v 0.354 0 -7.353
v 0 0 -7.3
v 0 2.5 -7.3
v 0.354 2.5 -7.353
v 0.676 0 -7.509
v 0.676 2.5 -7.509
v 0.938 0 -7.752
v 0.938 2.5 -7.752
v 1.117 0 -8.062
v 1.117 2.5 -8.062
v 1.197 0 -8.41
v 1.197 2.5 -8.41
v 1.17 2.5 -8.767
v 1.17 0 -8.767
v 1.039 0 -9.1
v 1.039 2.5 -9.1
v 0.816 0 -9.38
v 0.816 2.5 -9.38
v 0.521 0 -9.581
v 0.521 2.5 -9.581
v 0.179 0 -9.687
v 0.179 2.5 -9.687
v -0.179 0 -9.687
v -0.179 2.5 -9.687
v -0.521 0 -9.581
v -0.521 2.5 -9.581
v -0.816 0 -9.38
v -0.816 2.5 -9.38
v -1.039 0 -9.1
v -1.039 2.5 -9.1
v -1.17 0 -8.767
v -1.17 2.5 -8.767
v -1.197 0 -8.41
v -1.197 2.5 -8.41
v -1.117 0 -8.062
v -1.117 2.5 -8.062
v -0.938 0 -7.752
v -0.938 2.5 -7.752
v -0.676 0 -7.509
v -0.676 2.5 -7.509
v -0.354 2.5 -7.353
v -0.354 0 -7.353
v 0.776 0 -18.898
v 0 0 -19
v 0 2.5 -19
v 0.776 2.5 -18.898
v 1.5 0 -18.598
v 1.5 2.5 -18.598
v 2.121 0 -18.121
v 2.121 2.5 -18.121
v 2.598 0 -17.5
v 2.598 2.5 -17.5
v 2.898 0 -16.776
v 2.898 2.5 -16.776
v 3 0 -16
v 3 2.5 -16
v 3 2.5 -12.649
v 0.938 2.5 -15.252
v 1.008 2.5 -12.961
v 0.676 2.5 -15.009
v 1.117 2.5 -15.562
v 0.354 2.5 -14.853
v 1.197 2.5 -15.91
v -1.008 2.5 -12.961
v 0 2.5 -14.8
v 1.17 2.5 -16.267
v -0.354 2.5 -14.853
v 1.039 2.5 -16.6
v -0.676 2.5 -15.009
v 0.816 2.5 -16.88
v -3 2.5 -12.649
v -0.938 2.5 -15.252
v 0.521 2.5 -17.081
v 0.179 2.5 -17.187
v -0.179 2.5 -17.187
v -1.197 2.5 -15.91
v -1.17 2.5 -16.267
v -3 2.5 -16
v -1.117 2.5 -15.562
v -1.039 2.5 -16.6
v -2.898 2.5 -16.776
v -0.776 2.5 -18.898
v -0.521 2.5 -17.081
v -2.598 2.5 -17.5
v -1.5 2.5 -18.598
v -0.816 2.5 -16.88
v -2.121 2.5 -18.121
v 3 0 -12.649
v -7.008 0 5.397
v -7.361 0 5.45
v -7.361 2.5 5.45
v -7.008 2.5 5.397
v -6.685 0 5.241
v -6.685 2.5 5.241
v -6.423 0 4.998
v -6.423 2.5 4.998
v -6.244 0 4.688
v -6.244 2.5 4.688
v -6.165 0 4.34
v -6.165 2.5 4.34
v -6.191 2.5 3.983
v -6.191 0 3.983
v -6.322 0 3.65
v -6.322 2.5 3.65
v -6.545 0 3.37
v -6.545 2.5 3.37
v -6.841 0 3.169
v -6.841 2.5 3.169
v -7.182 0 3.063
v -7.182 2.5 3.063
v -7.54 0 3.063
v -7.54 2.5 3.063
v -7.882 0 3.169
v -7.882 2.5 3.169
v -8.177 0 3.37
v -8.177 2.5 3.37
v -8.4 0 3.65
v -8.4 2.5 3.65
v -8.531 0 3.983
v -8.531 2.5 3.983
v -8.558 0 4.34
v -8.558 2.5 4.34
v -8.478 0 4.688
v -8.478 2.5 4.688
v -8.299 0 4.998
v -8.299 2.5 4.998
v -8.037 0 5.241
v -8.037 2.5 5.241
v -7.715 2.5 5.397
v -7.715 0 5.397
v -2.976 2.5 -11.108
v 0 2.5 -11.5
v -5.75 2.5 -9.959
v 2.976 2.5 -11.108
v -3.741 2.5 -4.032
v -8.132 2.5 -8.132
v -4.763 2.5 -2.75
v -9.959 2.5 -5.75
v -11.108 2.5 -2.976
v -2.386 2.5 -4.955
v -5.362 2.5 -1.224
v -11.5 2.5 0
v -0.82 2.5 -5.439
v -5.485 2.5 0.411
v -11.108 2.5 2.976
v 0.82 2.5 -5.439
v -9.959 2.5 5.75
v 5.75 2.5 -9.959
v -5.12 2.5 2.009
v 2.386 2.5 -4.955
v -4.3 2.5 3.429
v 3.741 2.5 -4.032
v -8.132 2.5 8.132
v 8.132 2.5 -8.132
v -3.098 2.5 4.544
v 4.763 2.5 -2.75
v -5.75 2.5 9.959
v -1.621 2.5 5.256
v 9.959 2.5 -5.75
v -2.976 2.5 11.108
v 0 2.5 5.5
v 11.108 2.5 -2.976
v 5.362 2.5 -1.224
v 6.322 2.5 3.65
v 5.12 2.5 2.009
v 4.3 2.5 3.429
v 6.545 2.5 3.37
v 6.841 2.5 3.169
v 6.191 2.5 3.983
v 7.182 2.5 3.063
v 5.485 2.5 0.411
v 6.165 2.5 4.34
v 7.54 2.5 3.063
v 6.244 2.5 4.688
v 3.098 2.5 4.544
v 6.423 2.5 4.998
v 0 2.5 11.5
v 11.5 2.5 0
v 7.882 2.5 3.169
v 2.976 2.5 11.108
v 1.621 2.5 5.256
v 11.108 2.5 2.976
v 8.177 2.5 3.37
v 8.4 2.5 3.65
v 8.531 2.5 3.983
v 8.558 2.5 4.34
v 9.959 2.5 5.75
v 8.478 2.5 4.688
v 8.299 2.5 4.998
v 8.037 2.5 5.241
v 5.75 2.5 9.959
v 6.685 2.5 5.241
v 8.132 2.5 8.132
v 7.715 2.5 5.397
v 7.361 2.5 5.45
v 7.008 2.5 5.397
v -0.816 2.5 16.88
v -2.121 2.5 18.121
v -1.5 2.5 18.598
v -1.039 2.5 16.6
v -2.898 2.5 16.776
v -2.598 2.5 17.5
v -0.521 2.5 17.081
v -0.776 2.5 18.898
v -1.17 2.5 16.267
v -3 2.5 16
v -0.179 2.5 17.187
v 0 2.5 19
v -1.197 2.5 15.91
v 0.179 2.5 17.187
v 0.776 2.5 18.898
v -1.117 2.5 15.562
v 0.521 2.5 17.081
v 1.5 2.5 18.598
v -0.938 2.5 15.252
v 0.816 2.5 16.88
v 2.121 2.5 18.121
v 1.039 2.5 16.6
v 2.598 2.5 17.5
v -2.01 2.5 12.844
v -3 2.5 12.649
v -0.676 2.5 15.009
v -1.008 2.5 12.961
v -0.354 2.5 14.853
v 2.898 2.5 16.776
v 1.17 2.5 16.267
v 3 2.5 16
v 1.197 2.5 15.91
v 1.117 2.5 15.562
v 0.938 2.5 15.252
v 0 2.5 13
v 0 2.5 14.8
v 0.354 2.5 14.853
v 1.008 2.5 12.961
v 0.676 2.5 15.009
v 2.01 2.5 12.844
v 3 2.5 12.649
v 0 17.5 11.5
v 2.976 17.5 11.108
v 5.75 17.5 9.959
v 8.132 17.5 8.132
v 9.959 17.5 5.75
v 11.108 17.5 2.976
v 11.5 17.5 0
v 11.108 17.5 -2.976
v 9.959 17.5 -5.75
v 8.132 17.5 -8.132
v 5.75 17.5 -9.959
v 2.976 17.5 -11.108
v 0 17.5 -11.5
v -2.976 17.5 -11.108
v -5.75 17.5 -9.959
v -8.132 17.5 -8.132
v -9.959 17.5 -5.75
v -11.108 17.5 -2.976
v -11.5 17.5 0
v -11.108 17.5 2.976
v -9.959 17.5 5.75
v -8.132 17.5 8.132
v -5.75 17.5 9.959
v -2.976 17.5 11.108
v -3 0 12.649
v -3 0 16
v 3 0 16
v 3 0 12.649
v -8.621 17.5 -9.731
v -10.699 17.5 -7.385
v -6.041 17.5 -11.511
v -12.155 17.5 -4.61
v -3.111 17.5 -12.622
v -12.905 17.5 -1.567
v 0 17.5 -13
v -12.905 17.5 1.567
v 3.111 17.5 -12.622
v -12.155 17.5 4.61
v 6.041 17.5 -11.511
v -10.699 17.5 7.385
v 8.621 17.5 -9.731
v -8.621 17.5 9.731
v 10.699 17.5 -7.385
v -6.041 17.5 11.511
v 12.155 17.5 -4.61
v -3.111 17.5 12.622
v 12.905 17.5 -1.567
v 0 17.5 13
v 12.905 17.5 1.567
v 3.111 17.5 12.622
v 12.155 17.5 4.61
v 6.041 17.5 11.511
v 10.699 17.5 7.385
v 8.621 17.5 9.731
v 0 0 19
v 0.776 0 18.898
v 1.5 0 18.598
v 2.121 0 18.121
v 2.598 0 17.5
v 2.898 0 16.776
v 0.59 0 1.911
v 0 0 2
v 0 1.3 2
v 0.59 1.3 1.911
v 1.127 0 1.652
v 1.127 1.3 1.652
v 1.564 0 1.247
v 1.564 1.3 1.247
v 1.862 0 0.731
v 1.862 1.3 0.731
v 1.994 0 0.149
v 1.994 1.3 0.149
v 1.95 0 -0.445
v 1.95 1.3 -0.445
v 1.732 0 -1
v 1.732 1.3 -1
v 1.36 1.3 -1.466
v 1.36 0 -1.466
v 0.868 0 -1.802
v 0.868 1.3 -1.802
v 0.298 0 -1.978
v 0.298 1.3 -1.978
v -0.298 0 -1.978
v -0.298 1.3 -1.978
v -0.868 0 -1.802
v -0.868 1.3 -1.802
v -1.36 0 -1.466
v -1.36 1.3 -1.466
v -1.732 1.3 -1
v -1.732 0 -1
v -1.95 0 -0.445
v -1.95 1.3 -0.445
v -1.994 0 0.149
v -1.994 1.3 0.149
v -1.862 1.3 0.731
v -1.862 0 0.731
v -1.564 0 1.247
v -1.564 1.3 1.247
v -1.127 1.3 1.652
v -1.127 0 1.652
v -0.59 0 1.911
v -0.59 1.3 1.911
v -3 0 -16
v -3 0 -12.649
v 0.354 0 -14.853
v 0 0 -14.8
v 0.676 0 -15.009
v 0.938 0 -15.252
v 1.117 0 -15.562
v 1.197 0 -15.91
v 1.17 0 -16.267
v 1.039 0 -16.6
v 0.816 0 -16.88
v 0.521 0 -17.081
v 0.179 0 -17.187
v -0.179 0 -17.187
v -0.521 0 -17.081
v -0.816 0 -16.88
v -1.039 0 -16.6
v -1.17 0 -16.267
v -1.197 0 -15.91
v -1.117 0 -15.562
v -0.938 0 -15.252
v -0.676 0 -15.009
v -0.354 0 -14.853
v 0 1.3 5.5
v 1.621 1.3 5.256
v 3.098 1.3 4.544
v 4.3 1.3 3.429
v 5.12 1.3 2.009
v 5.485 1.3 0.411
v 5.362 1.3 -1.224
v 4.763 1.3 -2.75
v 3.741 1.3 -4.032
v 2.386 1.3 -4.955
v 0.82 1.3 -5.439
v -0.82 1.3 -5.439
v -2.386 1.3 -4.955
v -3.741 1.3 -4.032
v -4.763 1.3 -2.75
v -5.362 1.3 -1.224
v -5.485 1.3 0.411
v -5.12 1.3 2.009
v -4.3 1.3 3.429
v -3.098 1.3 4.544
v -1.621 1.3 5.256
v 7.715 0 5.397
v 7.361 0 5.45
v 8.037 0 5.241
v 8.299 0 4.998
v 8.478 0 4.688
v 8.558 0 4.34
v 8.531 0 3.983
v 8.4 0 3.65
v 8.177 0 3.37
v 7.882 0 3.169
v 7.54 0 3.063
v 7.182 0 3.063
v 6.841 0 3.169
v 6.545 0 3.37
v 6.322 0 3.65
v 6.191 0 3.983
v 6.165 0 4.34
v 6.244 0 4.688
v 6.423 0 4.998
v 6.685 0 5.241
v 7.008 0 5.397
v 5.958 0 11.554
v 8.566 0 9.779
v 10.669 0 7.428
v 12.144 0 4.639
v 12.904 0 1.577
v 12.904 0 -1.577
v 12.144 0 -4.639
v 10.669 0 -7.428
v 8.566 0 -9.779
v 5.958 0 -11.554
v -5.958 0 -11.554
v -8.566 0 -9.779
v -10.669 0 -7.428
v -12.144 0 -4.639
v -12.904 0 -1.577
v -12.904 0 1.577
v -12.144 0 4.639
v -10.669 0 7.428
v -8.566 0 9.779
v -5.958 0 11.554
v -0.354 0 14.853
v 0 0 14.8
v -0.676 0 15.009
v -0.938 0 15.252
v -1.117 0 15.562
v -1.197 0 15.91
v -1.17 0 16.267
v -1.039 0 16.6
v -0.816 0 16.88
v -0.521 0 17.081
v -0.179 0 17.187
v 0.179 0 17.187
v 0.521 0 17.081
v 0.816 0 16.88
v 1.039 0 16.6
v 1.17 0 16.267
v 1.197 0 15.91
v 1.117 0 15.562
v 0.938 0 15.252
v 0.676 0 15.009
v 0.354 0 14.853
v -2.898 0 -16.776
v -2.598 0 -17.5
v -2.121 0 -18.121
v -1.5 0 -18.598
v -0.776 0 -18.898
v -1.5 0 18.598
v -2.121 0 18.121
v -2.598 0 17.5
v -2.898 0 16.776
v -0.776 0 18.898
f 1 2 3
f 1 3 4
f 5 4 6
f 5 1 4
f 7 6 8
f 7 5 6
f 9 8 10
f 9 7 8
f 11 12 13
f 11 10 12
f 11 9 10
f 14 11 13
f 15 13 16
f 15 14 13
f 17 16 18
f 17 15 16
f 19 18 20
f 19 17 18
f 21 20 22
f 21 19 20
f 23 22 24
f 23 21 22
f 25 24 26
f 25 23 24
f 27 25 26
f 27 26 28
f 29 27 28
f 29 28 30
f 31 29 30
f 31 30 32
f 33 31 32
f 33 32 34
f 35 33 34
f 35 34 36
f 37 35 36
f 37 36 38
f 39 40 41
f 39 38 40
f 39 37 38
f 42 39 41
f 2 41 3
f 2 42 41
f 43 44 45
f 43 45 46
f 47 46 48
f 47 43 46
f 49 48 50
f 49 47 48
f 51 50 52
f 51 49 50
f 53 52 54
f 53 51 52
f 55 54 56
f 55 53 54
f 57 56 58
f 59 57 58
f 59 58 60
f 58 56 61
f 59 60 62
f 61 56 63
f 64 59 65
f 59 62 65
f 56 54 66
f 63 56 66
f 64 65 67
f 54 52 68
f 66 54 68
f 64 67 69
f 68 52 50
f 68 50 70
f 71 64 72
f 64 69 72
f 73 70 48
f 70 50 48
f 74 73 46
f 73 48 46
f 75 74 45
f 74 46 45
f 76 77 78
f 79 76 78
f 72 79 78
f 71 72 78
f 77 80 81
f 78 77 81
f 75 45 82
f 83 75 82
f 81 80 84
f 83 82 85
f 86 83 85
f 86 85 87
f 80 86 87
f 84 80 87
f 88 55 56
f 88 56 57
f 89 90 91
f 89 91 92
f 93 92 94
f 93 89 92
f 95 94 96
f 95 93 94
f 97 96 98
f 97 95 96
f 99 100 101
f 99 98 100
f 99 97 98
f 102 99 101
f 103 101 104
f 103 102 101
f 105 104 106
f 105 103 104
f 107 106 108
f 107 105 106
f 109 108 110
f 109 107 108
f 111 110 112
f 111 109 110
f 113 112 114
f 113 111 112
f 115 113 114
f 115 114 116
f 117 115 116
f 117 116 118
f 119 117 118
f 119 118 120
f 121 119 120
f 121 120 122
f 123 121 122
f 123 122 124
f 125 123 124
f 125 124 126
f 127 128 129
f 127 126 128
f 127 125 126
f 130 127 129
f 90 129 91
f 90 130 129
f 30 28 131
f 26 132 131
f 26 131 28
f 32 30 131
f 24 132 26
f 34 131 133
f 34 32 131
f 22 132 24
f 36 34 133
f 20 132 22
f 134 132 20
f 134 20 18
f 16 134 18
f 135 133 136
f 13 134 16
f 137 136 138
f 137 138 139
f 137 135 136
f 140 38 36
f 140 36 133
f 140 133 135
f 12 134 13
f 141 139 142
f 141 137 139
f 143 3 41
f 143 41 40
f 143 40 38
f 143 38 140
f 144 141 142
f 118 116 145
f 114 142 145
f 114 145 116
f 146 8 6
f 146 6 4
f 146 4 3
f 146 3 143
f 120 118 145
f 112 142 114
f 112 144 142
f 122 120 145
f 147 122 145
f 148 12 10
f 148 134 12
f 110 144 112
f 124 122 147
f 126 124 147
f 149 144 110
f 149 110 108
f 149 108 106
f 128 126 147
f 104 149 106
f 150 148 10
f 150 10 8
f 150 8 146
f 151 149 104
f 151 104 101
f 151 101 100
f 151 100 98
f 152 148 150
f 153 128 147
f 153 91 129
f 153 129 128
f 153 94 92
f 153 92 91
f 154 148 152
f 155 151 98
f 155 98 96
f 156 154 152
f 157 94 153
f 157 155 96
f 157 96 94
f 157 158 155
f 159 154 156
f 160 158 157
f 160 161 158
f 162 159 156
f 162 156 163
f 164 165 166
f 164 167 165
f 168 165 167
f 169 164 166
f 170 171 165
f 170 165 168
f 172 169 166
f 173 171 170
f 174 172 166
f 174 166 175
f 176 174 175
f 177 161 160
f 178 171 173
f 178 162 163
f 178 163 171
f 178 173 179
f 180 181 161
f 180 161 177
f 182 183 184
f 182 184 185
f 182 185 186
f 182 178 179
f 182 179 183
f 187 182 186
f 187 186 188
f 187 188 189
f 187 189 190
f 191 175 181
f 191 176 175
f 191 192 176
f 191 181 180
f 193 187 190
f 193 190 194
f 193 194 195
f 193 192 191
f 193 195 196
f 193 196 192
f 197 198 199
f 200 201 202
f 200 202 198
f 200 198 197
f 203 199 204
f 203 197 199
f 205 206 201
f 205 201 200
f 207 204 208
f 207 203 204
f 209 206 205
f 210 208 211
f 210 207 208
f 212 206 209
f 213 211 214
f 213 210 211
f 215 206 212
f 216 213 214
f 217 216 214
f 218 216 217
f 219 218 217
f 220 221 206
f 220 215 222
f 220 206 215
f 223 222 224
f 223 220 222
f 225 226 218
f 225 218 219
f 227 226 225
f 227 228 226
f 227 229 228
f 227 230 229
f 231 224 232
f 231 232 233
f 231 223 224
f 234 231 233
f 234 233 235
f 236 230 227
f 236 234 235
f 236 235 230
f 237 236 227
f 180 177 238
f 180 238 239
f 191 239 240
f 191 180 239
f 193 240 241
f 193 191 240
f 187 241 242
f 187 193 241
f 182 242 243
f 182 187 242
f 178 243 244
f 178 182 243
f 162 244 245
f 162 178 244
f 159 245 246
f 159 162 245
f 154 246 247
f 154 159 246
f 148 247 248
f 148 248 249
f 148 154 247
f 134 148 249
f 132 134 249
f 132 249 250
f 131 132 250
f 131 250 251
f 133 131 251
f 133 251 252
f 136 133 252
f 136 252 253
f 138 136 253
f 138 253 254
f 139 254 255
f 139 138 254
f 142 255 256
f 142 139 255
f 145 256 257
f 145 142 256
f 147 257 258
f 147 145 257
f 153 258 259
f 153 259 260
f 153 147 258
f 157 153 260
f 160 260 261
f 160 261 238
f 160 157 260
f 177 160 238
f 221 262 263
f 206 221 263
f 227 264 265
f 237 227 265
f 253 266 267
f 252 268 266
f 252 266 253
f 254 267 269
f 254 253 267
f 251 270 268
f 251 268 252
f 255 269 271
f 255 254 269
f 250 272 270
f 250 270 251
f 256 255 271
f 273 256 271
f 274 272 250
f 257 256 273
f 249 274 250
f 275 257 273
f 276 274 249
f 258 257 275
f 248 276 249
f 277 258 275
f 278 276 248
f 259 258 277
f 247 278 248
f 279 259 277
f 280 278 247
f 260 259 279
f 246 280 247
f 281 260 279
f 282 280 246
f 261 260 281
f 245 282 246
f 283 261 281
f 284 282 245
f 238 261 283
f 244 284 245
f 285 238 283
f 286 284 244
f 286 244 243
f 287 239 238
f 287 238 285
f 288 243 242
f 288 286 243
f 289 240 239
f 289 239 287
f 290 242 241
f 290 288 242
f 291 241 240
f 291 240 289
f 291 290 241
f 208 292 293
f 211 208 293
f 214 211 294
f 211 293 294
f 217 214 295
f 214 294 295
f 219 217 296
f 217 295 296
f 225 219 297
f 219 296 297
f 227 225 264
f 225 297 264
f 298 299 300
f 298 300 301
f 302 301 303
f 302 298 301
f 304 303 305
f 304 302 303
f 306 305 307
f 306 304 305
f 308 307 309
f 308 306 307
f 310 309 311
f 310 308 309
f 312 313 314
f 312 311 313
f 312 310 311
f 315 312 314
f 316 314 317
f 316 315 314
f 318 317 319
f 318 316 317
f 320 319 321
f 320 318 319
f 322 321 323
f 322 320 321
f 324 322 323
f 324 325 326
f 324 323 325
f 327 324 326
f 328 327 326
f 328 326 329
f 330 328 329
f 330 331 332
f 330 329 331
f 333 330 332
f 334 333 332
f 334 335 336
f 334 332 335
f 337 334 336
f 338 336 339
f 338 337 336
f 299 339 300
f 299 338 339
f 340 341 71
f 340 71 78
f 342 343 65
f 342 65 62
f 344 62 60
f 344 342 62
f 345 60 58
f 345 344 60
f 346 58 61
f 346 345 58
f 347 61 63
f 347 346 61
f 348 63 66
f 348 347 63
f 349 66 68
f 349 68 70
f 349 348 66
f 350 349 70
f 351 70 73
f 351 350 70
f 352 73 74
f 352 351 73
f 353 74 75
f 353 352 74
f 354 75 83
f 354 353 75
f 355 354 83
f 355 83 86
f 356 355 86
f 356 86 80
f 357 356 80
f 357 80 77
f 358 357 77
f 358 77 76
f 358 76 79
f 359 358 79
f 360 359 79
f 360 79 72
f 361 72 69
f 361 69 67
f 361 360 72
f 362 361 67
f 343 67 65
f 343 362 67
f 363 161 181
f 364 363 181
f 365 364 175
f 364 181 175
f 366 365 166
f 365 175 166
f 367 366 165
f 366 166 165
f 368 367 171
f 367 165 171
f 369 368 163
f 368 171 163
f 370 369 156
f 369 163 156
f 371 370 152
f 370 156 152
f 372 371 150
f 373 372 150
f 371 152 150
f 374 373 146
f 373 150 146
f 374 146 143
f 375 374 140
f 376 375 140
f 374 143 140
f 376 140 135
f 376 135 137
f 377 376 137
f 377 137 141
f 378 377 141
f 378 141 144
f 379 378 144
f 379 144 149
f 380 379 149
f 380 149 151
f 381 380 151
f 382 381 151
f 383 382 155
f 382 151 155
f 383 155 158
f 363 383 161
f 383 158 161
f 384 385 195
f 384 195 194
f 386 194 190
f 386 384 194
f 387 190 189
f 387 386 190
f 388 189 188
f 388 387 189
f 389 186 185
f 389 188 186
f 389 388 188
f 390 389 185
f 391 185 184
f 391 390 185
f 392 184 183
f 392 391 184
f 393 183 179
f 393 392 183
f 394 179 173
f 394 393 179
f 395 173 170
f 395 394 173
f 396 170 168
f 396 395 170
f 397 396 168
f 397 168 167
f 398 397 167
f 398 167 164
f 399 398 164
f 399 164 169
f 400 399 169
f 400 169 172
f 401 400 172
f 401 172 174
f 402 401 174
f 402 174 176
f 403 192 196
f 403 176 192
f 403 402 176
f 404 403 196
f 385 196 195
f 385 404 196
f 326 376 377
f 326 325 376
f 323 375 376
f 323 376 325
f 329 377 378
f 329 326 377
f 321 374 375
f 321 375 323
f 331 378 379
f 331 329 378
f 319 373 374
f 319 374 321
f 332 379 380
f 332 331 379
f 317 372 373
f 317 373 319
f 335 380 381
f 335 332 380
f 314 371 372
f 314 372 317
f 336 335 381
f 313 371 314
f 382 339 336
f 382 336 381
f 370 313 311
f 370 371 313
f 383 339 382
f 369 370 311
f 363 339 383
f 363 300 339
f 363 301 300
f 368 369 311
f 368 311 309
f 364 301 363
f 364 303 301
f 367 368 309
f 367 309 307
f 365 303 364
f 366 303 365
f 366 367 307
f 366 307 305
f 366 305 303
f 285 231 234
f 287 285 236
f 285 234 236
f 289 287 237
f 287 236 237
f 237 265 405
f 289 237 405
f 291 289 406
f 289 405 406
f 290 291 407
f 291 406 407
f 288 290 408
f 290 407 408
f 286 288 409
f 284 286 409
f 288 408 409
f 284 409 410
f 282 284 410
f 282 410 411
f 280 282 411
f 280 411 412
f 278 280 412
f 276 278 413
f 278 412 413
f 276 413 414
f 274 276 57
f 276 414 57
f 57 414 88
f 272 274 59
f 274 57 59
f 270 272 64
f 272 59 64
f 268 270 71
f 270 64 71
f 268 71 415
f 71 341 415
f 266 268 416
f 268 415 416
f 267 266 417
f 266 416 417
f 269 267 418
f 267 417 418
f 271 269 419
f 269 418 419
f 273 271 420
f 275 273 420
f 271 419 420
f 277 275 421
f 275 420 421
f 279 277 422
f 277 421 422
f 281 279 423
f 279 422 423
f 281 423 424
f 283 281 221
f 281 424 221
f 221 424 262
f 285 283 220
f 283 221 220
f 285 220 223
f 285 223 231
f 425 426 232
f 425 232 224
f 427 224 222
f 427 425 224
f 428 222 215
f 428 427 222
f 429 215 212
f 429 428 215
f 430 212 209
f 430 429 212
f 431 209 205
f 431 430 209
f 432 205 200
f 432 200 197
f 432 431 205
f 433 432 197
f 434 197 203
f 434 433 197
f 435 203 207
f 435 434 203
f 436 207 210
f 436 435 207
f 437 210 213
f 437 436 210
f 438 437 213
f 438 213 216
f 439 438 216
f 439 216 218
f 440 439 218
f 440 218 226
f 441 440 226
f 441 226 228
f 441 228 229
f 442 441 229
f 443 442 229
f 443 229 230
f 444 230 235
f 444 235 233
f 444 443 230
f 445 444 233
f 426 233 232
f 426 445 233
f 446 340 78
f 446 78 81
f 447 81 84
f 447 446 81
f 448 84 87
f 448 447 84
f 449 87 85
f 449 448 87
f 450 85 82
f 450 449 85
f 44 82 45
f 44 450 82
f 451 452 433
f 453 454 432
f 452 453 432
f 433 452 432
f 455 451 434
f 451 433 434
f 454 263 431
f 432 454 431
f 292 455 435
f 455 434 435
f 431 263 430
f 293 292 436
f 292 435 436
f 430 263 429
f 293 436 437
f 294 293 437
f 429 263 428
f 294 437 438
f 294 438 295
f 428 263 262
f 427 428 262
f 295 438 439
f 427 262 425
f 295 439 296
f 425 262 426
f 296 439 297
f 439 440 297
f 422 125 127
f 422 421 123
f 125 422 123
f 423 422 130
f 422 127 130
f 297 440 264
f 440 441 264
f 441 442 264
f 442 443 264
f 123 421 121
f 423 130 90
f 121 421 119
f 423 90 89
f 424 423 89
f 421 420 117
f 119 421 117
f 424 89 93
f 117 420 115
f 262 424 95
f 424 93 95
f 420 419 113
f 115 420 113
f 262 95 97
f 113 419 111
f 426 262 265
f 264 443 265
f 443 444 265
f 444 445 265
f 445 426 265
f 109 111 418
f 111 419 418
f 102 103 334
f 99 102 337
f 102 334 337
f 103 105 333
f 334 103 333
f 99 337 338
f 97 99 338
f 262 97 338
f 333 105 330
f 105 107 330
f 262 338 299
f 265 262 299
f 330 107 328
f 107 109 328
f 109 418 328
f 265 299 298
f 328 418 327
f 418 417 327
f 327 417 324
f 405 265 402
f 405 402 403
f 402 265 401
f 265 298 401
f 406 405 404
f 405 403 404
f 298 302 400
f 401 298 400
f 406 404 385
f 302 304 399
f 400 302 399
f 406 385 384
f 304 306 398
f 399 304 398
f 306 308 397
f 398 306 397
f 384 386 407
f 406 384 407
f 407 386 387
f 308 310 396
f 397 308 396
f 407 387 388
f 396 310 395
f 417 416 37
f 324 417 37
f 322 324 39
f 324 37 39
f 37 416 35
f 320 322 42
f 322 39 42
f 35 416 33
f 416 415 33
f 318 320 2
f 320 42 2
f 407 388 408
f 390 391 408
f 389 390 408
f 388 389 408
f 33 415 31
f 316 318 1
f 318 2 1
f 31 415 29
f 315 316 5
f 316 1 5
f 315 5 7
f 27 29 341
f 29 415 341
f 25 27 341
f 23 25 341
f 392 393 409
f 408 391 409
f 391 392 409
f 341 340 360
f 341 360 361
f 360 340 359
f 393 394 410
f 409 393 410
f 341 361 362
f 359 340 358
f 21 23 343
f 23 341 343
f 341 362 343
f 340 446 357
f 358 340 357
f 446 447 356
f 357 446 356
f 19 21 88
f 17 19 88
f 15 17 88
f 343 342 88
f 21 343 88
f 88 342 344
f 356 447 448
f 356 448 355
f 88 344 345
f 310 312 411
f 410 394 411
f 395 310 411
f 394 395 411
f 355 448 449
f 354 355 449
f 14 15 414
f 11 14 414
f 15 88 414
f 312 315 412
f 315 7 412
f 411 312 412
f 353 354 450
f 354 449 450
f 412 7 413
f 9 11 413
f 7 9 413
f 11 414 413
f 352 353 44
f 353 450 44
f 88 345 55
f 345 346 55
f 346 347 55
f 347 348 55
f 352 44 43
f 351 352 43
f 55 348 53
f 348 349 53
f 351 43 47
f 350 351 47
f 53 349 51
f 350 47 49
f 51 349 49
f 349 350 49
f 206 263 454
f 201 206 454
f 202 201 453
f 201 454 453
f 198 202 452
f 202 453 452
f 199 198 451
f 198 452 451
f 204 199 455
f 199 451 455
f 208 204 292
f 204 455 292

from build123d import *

# Parameters (mm, degrees)
SKETCH1_R               = 13
BOSS_EXTRUDE1_DEPTH     = 2.5
BOSS_EXTRUDE2_START     = 2.5
SKETCH2_R               = 13
SKETCH2_R_2             = 11.5
BOSS_EXTRUDE2_DEPTH     = 15
CUT_EXTRUDE1_START      = 2.5
SKETCH3_R               = 5.5
CUT_EXTRUDE1_DEPTH      = 1.2
CUT_EXTRUDE2_DEPTH      = 26.382080293
CUT_EXTRUDE2_DEPTH_BACK = 26.382080293
SKETCH4_R               = 1.2
SKETCH4_R_2             = 2
SKETCH5_R               = 1.2
BOSS_EXTRUDE3_DEPTH     = 2.5


with BuildPart() as part:
    # Sketch1 → Boss-Extrude1 (new body)
    with BuildSketch(Plane(origin=(0, 0, 0), x_dir=(1, 0, 0), z_dir=(0, 1, 0))):
        with Locations(Location((0, 0, 0), (0, 0, 270))):
            Circle(SKETCH1_R)
    extrude(amount=BOSS_EXTRUDE1_DEPTH)

    # Sketch2 → Boss-Extrude2 (add)
    with BuildSketch(Plane(origin=(0, 0, 0), x_dir=(1, 0, 0), z_dir=(0, 1, 0)).offset(BOSS_EXTRUDE2_START)):
        with Locations(Location((0, 0, 0), (0, 0, 270))):
            Circle(SKETCH2_R)
        with Locations(Location((0, 0, 0), (0, 0, 270))):
            Circle(SKETCH2_R_2, mode=Mode.SUBTRACT)
    extrude(amount=BOSS_EXTRUDE2_DEPTH)

    # Sketch3 → Cut-Extrude1 (cut)
    with BuildSketch(Plane(origin=(0, 0, 0), x_dir=(1, 0, 0), z_dir=(0, 1, 0)).offset(CUT_EXTRUDE1_START)):
        with Locations(Location((0, 0, 0), (0, 0, 270))):
            Circle(SKETCH3_R)
    extrude(amount=-CUT_EXTRUDE1_DEPTH, mode=Mode.SUBTRACT)

    # Sketch4 → Cut-Extrude2 (cut, two sides: drawn at the far end of the back side and taken through both)
    with BuildSketch(Plane(origin=(0, 0, 0), x_dir=(1, 0, 0), z_dir=(0, 1, 0)).offset(-CUT_EXTRUDE2_DEPTH_BACK)):
        with Locations(Location((0, 8.5, 0), (0, 0, 270))):
            Circle(SKETCH4_R)
        with Locations(Location((7.361215932, -4.25, 0), (0, 0, 270))):
            Circle(SKETCH4_R)
        with Locations(Location((-7.361215932, -4.25, 0), (0, 0, 270))):
            Circle(SKETCH4_R)
        with Locations(Location((0, 0, 0), (0, 0, 270))):
            Circle(SKETCH4_R_2)
    extrude(amount=CUT_EXTRUDE2_DEPTH + CUT_EXTRUDE2_DEPTH_BACK, mode=Mode.SUBTRACT)

    # Sketch5 → Boss-Extrude3 (add)
    # profile 1 of 2: a face of its own
    with BuildSketch(Plane(origin=(0, 0, 0), x_dir=(1, 0, 0), z_dir=(0, 1, 0))):
        with BuildLine():
            Line((-3, 12.649110641), (-3, 16))
            ThreePointArc((-3, 16), (-2.121320344, 18.121320344), (0, 19))
            ThreePointArc((0, 19), (2.121320344, 18.121320344), (3, 16))
            Line((3, 16), (3, 12.649110641))
            ThreePointArc((3, 12.649110641), (0, 13), (-3, 12.649110641))
        make_face()
        with Locations(Location((0, 16, 0), (0, 0, 270))):
            Circle(SKETCH5_R, mode=Mode.SUBTRACT)
    # profile 2 of 2: a face of its own
    with BuildSketch(Plane(origin=(0, 0, 0), x_dir=(1, 0, 0), z_dir=(0, 1, 0))):
        with BuildLine():
            Line((3, -16), (3, -12.649110641))
            ThreePointArc((3, -12.649110641), (0, -13), (-3, -12.649110641))
            Line((-3, -12.649110641), (-3, -16))
            ThreePointArc((-3, -16), (-2.121320344, -18.121320344), (0, -19))
            ThreePointArc((0, -19), (2.121320344, -18.121320344), (3, -16))
        make_face()
        with Locations(Location((0, -16, 0), (0, 0, 90))):
            Circle(SKETCH5_R, mode=Mode.SUBTRACT)
    extrude(amount=BOSS_EXTRUDE3_DEPTH)


solid = part.part
